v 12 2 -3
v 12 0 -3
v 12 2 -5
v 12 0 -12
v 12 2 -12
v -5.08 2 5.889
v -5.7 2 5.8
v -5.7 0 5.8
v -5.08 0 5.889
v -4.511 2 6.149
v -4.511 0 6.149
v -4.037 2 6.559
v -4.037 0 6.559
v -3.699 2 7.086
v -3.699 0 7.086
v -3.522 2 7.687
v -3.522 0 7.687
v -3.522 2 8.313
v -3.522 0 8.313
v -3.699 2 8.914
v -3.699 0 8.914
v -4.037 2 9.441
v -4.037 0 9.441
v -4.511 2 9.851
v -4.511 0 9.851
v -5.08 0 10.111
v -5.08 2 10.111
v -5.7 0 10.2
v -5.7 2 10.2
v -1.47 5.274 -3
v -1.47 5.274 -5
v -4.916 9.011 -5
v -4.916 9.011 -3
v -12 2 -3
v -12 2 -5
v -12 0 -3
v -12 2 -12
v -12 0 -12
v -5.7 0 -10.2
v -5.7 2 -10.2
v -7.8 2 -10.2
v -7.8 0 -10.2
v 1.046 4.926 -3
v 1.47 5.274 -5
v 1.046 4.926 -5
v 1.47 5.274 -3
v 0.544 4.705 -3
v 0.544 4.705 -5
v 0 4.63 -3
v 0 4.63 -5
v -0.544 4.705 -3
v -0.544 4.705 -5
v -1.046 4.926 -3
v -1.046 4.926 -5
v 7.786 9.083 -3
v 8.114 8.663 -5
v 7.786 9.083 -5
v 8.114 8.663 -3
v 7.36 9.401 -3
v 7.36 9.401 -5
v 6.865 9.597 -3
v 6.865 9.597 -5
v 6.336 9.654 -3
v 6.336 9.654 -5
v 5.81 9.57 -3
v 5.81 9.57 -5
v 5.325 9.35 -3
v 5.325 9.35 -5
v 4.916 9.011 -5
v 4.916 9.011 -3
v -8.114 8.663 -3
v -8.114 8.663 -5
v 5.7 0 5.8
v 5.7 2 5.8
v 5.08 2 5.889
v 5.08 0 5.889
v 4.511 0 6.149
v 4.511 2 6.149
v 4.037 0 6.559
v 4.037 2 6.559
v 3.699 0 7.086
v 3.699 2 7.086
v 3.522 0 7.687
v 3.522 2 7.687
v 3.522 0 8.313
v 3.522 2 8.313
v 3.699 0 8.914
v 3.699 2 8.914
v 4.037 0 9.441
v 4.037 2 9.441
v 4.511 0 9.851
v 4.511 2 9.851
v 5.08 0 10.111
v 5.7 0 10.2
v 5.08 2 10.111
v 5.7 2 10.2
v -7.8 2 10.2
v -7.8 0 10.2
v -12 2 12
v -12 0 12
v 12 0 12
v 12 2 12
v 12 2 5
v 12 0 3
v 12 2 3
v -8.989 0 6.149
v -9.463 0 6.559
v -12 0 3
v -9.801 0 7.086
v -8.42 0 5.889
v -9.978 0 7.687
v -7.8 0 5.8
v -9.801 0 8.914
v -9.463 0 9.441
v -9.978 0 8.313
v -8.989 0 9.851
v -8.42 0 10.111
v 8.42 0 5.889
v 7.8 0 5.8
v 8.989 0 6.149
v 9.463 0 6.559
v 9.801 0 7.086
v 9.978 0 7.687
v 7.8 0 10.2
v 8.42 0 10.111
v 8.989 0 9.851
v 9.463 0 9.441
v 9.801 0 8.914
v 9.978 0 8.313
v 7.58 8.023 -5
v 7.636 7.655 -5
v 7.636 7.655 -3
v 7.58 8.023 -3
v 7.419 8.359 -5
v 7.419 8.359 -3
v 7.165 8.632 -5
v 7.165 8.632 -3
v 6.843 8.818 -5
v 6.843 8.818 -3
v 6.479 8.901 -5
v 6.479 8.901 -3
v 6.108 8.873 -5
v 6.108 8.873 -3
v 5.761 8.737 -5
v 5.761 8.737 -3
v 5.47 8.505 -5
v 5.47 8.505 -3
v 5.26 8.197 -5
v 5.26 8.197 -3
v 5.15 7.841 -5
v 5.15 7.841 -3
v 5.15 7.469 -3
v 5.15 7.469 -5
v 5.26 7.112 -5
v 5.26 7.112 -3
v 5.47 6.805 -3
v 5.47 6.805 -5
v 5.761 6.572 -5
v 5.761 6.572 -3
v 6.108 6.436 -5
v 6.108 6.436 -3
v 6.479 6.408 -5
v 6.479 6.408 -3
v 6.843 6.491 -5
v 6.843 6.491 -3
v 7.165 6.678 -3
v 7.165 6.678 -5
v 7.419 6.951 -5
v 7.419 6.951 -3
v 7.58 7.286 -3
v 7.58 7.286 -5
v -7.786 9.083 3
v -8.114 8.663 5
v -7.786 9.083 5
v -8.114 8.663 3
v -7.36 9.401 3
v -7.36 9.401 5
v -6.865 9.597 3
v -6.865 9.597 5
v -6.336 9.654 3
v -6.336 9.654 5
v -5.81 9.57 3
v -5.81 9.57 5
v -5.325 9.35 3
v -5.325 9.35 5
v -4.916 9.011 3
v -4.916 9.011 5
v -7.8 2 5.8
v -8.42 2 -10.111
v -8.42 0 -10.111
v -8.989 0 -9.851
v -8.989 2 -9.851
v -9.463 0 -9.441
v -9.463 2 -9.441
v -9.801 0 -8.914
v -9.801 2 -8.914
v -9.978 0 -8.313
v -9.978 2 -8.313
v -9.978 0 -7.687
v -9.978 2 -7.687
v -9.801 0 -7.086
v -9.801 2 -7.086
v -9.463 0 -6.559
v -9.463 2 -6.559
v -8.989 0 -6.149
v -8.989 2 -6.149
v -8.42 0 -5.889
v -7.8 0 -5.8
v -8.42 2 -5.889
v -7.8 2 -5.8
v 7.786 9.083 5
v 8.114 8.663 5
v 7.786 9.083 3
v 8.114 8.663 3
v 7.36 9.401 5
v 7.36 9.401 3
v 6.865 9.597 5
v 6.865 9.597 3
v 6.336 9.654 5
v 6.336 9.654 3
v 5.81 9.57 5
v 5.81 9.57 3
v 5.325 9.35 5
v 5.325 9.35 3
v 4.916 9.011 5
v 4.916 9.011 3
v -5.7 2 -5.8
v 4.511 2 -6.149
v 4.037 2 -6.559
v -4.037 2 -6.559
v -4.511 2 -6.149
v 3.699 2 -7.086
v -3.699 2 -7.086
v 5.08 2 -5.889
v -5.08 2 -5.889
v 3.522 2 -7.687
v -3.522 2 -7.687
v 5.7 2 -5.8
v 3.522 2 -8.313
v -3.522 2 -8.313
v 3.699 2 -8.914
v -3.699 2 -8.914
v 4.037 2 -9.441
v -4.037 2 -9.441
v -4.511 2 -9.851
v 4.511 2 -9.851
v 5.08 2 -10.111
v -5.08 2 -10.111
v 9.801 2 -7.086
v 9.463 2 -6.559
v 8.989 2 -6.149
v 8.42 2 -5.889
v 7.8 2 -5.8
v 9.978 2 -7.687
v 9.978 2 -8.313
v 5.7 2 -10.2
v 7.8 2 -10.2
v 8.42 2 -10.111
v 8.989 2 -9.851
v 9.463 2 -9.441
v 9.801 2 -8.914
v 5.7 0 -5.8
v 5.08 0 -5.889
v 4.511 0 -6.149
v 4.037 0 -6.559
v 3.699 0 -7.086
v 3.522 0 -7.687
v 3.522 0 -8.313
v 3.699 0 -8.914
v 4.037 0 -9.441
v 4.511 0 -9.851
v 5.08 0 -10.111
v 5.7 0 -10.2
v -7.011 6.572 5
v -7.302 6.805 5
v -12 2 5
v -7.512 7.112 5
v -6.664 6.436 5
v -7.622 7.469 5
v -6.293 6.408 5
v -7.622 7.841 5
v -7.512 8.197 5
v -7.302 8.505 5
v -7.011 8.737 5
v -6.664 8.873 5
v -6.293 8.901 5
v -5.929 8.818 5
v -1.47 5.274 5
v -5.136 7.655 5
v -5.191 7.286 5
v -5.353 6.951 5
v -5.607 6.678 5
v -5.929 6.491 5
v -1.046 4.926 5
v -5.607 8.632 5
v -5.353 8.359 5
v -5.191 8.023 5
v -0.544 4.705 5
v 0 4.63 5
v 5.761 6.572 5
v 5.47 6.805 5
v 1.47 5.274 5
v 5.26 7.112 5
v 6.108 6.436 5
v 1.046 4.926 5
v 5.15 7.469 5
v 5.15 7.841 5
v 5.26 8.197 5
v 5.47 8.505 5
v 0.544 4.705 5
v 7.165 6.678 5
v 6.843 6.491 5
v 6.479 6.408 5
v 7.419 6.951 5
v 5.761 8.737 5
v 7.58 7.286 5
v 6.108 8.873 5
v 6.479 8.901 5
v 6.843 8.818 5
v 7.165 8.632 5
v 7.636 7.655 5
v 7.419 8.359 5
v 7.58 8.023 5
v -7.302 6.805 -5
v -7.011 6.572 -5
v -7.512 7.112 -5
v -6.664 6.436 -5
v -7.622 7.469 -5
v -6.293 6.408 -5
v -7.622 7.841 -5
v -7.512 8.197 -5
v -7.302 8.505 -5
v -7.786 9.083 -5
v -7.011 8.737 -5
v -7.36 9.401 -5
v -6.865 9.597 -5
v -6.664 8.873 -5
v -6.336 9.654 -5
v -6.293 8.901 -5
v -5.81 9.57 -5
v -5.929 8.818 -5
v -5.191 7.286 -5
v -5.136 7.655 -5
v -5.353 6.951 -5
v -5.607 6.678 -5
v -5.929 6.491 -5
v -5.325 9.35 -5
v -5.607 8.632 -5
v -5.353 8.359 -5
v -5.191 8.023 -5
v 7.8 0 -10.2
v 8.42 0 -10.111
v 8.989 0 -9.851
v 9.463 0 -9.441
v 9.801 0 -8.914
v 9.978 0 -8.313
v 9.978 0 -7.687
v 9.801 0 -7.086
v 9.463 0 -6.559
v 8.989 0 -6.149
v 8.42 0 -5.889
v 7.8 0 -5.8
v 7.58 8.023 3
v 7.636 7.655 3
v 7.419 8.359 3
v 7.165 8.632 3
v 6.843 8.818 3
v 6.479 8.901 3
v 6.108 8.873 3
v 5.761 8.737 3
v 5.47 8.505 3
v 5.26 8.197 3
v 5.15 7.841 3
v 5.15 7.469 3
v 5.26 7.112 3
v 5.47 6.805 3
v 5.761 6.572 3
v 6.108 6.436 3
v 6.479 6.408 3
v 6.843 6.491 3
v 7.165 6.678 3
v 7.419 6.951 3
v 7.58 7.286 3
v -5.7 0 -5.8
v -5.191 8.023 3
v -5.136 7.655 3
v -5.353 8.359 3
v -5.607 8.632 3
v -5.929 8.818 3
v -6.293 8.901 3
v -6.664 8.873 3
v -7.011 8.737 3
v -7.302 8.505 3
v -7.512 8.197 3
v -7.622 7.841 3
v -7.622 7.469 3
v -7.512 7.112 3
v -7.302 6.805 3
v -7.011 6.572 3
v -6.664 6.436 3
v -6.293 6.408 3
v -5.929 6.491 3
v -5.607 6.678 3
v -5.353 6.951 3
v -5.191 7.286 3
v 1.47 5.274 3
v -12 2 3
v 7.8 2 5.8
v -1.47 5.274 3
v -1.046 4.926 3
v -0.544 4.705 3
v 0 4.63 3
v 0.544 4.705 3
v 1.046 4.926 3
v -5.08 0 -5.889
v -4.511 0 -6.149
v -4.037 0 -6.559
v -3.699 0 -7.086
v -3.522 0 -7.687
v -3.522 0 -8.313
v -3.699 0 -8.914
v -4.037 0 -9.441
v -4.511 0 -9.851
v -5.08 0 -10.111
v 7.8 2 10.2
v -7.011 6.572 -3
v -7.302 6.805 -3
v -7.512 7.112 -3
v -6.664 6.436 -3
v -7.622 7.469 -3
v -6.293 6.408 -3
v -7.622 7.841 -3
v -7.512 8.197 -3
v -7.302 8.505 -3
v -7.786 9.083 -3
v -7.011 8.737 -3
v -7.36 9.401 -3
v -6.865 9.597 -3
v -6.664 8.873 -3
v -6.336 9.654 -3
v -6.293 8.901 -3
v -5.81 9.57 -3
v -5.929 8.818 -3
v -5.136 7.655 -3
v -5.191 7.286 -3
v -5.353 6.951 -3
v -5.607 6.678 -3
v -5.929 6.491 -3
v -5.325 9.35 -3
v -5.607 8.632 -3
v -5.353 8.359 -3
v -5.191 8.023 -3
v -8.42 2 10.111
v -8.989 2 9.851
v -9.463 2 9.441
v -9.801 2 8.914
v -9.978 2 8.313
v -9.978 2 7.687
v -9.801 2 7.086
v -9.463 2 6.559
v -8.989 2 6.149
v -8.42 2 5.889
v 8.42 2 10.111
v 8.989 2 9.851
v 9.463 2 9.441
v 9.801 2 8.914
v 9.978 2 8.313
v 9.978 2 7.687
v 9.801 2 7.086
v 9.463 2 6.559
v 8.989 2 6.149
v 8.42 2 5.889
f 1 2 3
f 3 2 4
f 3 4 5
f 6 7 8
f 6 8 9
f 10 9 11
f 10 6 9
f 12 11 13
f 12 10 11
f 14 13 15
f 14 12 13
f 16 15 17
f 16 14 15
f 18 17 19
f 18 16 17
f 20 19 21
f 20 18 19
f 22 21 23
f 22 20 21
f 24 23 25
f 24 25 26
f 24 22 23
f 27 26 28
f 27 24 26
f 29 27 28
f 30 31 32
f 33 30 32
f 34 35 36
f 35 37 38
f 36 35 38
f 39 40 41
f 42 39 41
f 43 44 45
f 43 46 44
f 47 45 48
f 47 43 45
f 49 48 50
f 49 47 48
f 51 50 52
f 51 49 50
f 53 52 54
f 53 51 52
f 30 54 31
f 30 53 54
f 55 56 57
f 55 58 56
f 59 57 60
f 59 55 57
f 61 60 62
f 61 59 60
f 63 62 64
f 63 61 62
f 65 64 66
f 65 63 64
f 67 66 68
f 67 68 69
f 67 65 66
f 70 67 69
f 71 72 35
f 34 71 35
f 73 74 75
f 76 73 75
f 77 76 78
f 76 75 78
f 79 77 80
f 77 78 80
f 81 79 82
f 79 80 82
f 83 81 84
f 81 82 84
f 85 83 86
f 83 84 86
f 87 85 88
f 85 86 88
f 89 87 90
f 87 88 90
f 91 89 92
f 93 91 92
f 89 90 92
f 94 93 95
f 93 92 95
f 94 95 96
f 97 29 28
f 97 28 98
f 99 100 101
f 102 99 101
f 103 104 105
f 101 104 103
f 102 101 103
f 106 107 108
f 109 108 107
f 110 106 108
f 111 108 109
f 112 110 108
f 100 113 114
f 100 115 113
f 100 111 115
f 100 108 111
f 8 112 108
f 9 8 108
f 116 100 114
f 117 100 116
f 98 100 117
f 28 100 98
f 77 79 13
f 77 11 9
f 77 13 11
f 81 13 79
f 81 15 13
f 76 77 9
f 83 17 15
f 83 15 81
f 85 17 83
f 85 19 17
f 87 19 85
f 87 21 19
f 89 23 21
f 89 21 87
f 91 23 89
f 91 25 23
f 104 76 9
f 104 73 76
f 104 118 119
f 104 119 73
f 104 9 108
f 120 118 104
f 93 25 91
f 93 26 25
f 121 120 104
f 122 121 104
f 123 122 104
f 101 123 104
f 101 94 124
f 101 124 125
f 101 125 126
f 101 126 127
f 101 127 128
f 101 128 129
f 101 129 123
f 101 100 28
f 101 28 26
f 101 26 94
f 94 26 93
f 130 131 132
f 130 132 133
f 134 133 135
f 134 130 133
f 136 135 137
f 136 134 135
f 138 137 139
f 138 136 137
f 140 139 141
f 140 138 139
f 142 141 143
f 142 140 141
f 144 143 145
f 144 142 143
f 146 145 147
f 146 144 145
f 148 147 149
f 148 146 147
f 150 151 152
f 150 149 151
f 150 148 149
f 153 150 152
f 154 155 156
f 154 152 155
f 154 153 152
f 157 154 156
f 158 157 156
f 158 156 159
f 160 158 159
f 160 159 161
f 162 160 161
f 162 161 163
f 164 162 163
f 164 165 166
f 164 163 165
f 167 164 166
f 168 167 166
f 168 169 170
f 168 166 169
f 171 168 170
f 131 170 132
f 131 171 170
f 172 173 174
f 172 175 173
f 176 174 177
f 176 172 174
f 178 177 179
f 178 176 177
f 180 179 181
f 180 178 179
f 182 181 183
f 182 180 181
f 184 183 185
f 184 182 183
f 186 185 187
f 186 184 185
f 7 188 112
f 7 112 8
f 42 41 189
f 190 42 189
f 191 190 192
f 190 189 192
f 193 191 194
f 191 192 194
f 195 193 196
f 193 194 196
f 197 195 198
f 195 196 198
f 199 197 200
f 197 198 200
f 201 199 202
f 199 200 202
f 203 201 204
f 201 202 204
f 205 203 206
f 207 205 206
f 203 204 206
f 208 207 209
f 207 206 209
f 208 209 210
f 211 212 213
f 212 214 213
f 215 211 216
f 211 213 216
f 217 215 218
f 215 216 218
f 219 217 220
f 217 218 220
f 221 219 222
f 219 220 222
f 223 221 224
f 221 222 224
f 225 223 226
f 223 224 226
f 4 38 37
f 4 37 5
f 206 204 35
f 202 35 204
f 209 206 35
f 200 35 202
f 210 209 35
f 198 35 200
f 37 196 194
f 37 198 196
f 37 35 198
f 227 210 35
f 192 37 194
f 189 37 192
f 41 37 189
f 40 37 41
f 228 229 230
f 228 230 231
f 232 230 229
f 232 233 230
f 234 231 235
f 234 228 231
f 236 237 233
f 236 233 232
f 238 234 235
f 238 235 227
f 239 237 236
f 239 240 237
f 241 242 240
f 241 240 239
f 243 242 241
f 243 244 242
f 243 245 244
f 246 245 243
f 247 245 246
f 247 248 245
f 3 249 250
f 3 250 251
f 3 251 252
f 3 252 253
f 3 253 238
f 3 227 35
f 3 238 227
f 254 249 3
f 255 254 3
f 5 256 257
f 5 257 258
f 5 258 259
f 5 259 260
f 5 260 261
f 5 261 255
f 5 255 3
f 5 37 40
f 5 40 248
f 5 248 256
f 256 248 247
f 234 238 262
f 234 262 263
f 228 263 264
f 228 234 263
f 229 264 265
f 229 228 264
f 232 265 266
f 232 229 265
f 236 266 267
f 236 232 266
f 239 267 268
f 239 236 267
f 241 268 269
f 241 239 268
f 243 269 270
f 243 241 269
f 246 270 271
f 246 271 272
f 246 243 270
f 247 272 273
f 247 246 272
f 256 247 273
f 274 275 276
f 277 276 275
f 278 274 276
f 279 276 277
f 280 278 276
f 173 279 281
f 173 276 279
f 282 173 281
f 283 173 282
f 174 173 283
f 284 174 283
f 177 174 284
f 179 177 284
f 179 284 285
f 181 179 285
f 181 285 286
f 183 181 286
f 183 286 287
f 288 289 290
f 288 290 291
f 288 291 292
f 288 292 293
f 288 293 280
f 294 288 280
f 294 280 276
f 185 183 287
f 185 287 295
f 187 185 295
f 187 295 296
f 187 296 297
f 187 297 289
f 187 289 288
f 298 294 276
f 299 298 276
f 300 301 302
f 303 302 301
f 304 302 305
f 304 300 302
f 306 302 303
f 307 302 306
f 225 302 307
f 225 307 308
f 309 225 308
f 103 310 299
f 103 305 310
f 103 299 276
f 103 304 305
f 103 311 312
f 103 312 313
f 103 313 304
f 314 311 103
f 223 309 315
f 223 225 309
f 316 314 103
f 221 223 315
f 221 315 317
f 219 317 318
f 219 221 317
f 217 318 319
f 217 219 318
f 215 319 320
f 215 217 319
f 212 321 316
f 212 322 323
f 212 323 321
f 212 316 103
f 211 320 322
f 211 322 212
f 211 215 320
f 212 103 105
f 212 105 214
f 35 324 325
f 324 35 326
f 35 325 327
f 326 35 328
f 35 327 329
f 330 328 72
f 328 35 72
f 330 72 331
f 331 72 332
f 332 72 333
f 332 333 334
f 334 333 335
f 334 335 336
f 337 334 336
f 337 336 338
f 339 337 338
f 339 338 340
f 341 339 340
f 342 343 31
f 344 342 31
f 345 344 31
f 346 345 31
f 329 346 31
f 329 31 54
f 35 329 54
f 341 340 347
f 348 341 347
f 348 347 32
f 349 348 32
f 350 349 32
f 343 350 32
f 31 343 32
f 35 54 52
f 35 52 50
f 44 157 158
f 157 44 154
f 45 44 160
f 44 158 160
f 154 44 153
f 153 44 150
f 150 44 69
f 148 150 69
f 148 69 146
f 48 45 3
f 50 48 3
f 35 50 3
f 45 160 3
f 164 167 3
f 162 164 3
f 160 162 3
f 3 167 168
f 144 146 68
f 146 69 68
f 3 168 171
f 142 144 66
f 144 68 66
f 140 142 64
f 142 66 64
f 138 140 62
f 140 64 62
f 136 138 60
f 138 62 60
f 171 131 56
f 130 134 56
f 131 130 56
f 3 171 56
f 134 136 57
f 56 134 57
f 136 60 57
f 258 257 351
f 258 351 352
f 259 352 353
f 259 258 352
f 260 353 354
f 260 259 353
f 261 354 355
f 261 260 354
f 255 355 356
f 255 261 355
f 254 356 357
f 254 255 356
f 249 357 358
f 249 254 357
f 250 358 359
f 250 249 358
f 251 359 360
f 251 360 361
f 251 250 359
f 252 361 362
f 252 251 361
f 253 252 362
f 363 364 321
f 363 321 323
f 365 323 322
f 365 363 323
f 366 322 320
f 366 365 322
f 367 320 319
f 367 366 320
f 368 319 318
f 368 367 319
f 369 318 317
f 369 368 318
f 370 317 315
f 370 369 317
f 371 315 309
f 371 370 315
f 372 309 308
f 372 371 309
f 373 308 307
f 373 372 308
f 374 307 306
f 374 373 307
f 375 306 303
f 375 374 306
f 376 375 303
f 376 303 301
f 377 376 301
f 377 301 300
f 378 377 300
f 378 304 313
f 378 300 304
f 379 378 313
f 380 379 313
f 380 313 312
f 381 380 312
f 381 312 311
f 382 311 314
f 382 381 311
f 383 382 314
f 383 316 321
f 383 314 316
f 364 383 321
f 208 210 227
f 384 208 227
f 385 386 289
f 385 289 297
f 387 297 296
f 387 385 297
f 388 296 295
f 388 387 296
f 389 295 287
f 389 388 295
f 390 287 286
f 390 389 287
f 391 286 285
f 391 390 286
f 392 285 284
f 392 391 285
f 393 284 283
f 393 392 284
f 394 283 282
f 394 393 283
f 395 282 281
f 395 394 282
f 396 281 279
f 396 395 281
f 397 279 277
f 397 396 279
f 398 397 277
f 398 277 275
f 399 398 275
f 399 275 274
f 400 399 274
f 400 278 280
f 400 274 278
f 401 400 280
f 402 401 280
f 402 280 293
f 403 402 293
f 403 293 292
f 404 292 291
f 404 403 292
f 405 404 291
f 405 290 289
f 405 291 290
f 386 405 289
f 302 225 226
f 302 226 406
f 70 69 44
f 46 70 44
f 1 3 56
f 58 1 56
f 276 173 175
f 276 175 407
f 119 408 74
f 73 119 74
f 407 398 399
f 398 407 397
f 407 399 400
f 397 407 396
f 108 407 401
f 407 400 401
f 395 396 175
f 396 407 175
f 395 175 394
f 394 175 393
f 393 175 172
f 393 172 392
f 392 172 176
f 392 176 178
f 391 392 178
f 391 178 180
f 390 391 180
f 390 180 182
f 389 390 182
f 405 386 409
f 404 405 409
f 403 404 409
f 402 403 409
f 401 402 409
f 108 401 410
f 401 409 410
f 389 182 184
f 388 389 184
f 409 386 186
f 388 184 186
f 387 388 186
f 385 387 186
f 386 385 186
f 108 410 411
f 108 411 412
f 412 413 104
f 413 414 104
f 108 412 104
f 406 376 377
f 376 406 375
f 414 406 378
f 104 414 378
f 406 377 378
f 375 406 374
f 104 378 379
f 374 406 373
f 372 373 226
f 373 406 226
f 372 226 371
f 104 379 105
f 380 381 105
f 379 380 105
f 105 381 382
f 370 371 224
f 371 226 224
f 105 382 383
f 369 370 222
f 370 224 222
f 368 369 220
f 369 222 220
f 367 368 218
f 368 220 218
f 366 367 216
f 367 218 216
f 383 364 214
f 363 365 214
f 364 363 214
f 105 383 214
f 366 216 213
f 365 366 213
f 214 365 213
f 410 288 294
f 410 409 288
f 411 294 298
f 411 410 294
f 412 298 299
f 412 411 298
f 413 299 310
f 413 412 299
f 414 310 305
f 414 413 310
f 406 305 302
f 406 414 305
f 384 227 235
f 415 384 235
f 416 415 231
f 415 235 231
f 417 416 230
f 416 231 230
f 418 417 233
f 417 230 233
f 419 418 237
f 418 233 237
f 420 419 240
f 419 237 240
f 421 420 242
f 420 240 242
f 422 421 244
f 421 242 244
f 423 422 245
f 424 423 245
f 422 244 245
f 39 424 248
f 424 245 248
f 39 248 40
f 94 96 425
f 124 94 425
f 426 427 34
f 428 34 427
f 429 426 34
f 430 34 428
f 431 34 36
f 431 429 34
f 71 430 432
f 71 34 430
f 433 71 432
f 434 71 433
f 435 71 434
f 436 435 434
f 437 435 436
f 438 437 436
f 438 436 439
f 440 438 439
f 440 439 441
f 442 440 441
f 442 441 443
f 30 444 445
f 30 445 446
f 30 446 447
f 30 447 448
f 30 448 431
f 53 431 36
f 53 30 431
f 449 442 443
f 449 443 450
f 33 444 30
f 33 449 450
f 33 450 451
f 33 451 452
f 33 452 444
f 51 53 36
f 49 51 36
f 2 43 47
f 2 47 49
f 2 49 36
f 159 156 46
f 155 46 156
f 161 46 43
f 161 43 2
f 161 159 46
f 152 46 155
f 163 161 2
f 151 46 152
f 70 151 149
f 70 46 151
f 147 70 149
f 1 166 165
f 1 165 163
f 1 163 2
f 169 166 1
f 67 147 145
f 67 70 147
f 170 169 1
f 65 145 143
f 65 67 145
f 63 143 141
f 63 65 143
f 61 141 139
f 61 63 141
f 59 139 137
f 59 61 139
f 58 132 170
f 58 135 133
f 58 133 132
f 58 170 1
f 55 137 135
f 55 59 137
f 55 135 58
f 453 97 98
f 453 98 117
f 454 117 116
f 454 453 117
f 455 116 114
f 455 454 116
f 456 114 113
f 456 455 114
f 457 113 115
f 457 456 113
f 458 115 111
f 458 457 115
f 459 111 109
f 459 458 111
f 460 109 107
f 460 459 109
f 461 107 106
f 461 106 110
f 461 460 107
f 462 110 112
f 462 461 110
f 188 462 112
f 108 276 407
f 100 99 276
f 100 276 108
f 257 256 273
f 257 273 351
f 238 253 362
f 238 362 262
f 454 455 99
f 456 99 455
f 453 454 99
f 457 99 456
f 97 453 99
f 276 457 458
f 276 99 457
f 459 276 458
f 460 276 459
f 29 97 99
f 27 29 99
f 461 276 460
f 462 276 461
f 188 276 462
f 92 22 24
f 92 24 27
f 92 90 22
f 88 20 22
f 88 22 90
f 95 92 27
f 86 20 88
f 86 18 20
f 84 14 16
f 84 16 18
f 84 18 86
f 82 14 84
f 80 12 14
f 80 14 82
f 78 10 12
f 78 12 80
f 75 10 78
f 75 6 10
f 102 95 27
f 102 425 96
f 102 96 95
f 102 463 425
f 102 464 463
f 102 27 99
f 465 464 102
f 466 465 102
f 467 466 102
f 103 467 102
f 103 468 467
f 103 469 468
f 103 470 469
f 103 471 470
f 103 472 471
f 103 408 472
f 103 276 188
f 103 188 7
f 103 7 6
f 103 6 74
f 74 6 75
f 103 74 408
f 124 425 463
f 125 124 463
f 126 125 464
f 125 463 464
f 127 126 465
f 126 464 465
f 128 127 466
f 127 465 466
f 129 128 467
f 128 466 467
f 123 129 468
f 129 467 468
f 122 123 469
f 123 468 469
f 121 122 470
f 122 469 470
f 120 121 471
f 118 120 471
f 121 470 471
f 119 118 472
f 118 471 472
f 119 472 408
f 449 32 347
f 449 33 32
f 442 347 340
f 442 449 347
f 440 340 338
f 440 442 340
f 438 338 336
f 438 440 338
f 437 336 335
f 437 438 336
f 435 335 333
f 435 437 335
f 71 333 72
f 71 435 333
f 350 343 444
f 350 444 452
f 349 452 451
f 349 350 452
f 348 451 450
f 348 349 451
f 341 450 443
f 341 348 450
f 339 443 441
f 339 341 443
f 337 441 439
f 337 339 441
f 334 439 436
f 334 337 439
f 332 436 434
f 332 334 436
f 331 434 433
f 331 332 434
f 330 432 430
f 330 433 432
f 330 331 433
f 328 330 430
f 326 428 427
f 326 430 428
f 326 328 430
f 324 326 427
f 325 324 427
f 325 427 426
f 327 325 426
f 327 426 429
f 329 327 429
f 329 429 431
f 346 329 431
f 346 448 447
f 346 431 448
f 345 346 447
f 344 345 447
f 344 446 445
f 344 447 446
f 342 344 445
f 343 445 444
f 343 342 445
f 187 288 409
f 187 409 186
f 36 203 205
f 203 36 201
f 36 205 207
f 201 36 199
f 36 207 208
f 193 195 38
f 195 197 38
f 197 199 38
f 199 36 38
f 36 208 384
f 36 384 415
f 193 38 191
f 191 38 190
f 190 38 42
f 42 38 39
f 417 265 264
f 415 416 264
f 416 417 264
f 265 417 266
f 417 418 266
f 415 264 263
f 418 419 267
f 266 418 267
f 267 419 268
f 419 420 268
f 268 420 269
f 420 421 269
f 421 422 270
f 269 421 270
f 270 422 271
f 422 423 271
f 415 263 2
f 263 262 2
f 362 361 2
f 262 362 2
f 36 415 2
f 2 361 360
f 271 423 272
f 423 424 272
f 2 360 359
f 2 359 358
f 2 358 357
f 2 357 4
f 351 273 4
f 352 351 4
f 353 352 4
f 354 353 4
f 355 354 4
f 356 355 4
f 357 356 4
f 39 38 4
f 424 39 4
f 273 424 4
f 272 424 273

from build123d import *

# Parameters (mm, degrees)
SKETCH3_W               = 24
SKETCH3_H               = 7
BOSS_EXTRUDE2_DEPTH     = 2
BOSS_EXTRUDE2_2_DEPTH   = 2
BOSS_EXTRUDE3_DEPTH     = 2
FILLET3_R               = 2
CUT_EXTRUDE2_DEPTH      = 2
FILLET3_OF_MIRROR34_R   = 2
CUT_EXTRUDE3_DEPTH      = 23.939392052
CUT_EXTRUDE3_DEPTH_BACK = 23.939392052
SKETCH7_R               = 1.25


with BuildPart() as part:
    # Sketch3 → Boss-Extrude2 (new body)
    with BuildSketch(Plane(origin=(0, 0, 0), x_dir=(1, 0, 0), z_dir=(0, 1, 0))):
        with Locations((0, -8.5)):
            Rectangle(SKETCH3_W, SKETCH3_H)
    boss_extrude2 = extrude(amount=BOSS_EXTRUDE2_DEPTH)

    # Sketch5 → Boss-Extrude3 (add)
    with BuildSketch(Plane(origin=(0, 0, 5), x_dir=(-1, 0, 0), z_dir=(0, 0, -1))):
        Polygon((-12, 2), (-6.75, 11), (0, 3.679615637), (6.75, 11), (12, 2), (12, 0), (-12, 0), align=None)
    boss_extrude3 = extrude(amount=BOSS_EXTRUDE3_DEPTH)

    # Fillet3
    fillet3_edges = [part.edges().sort_by_distance(p)[0] for p in [
        (-6.75, 11, 4),
        (0, 3.679615637, 4),
        (6.75, 11, 4),
    ]]
    fillet(fillet3_edges, radius=FILLET3_R)


with BuildPart() as body_2:
    # Sketch3 → Boss-Extrude2 2 (new body)
    with BuildSketch(Plane(origin=(0, 0, 0), x_dir=(1, 0, 0), z_dir=(0, 1, 0))):
        with Locations((0, 8.5)):
            Rectangle(SKETCH3_W, SKETCH3_H)
    boss_extrude2_2 = extrude(amount=BOSS_EXTRUDE2_2_DEPTH)


with BuildPart() as cut_extrude2_tool:
    # Sketch4 → Cut-Extrude2 (new body)
    with BuildSketch(Plane(origin=(0, 2, 0), x_dir=(1, 0, 0), z_dir=(0, 1, 0))):
        with BuildLine():
            Line((-7.8, -5.8), (-5.7, -5.8))
            ThreePointArc((-5.7, -5.8), (-3.5, -8), (-5.7, -10.2))
            Line((-5.7, -10.2), (-7.8, -10.2))
            ThreePointArc((-7.8, -10.2), (-10, -8), (-7.8, -5.8))
        make_face()
        with BuildLine():
            Line((5.7, -10.2), (7.8, -10.2))
            ThreePointArc((7.8, -10.2), (10, -8), (7.8, -5.8))
            Line((7.8, -5.8), (5.7, -5.8))
            ThreePointArc((5.7, -5.8), (3.5, -8), (5.7, -10.2))
        make_face()
        with BuildLine():
            Line((-7.8, 5.8), (-5.7, 5.8))
            ThreePointArc((-5.7, 5.8), (-3.5, 8), (-5.7, 10.2))
            Line((-5.7, 10.2), (-7.8, 10.2))
            ThreePointArc((-7.8, 10.2), (-10, 8), (-7.8, 5.8))
        make_face()
        with BuildLine():
            Line((5.7, 10.2), (7.8, 10.2))
            ThreePointArc((7.8, 10.2), (10, 8), (7.8, 5.8))
            Line((7.8, 5.8), (5.7, 5.8))
            ThreePointArc((5.7, 5.8), (3.5, 8), (5.7, 10.2))
        make_face()
    cut_extrude2 = extrude(amount=-CUT_EXTRUDE2_DEPTH)


with BuildPart() as part_1:
    add(part.part)

    # Cut-Extrude2: cut by cut_extrude2_tool
    add(cut_extrude2_tool.part, mode=Mode.SUBTRACT)



with BuildPart() as body_2_1:
    add(body_2.part)

    # Cut-Extrude2: cut by cut_extrude2_tool
    add(cut_extrude2_tool.part, mode=Mode.SUBTRACT)


with BuildPart() as part_2:
    add(part_1.part)

    add(body_2_1.part)  # Mirror34 merges body 2
    # Mirror34: Boss-Extrude2, Boss-Extrude2 2, Boss-Extrude3 across plane
    add(boss_extrude2.mirror(Plane.XY))
    add(boss_extrude2_2.mirror(Plane.XY))
    add(boss_extrude3.mirror(Plane.XY))

    # Mirror34 2: Cut-Extrude2 across plane
    add(cut_extrude2.mirror(Plane.XY), mode=Mode.SUBTRACT)

    # Fillet3 of Mirror34
    fillet3_of_mirror34_edges = [part_2.edges().sort_by_distance(p)[0] for p in [
        (-6.75, 11, -4),
        (0, 3.679615637, -4),
        (6.75, 11, -4),
    ]]
    fillet(fillet3_of_mirror34_edges, radius=FILLET3_OF_MIRROR34_R)

    # Sketch7 → Cut-Extrude3 (cut, two sides: drawn at the far end of the back side and taken through both)
    with BuildSketch(Plane.XY.offset(5).offset(-CUT_EXTRUDE3_DEPTH_BACK)):
        with Locations((-6.38594288, 7.654828208)):
            Circle(SKETCH7_R)
        with Locations((6.38594288, 7.654828208)):
            Circle(SKETCH7_R)
    extrude(amount=CUT_EXTRUDE3_DEPTH + CUT_EXTRUDE3_DEPTH_BACK, mode=Mode.SUBTRACT)


solid = part_2.part
